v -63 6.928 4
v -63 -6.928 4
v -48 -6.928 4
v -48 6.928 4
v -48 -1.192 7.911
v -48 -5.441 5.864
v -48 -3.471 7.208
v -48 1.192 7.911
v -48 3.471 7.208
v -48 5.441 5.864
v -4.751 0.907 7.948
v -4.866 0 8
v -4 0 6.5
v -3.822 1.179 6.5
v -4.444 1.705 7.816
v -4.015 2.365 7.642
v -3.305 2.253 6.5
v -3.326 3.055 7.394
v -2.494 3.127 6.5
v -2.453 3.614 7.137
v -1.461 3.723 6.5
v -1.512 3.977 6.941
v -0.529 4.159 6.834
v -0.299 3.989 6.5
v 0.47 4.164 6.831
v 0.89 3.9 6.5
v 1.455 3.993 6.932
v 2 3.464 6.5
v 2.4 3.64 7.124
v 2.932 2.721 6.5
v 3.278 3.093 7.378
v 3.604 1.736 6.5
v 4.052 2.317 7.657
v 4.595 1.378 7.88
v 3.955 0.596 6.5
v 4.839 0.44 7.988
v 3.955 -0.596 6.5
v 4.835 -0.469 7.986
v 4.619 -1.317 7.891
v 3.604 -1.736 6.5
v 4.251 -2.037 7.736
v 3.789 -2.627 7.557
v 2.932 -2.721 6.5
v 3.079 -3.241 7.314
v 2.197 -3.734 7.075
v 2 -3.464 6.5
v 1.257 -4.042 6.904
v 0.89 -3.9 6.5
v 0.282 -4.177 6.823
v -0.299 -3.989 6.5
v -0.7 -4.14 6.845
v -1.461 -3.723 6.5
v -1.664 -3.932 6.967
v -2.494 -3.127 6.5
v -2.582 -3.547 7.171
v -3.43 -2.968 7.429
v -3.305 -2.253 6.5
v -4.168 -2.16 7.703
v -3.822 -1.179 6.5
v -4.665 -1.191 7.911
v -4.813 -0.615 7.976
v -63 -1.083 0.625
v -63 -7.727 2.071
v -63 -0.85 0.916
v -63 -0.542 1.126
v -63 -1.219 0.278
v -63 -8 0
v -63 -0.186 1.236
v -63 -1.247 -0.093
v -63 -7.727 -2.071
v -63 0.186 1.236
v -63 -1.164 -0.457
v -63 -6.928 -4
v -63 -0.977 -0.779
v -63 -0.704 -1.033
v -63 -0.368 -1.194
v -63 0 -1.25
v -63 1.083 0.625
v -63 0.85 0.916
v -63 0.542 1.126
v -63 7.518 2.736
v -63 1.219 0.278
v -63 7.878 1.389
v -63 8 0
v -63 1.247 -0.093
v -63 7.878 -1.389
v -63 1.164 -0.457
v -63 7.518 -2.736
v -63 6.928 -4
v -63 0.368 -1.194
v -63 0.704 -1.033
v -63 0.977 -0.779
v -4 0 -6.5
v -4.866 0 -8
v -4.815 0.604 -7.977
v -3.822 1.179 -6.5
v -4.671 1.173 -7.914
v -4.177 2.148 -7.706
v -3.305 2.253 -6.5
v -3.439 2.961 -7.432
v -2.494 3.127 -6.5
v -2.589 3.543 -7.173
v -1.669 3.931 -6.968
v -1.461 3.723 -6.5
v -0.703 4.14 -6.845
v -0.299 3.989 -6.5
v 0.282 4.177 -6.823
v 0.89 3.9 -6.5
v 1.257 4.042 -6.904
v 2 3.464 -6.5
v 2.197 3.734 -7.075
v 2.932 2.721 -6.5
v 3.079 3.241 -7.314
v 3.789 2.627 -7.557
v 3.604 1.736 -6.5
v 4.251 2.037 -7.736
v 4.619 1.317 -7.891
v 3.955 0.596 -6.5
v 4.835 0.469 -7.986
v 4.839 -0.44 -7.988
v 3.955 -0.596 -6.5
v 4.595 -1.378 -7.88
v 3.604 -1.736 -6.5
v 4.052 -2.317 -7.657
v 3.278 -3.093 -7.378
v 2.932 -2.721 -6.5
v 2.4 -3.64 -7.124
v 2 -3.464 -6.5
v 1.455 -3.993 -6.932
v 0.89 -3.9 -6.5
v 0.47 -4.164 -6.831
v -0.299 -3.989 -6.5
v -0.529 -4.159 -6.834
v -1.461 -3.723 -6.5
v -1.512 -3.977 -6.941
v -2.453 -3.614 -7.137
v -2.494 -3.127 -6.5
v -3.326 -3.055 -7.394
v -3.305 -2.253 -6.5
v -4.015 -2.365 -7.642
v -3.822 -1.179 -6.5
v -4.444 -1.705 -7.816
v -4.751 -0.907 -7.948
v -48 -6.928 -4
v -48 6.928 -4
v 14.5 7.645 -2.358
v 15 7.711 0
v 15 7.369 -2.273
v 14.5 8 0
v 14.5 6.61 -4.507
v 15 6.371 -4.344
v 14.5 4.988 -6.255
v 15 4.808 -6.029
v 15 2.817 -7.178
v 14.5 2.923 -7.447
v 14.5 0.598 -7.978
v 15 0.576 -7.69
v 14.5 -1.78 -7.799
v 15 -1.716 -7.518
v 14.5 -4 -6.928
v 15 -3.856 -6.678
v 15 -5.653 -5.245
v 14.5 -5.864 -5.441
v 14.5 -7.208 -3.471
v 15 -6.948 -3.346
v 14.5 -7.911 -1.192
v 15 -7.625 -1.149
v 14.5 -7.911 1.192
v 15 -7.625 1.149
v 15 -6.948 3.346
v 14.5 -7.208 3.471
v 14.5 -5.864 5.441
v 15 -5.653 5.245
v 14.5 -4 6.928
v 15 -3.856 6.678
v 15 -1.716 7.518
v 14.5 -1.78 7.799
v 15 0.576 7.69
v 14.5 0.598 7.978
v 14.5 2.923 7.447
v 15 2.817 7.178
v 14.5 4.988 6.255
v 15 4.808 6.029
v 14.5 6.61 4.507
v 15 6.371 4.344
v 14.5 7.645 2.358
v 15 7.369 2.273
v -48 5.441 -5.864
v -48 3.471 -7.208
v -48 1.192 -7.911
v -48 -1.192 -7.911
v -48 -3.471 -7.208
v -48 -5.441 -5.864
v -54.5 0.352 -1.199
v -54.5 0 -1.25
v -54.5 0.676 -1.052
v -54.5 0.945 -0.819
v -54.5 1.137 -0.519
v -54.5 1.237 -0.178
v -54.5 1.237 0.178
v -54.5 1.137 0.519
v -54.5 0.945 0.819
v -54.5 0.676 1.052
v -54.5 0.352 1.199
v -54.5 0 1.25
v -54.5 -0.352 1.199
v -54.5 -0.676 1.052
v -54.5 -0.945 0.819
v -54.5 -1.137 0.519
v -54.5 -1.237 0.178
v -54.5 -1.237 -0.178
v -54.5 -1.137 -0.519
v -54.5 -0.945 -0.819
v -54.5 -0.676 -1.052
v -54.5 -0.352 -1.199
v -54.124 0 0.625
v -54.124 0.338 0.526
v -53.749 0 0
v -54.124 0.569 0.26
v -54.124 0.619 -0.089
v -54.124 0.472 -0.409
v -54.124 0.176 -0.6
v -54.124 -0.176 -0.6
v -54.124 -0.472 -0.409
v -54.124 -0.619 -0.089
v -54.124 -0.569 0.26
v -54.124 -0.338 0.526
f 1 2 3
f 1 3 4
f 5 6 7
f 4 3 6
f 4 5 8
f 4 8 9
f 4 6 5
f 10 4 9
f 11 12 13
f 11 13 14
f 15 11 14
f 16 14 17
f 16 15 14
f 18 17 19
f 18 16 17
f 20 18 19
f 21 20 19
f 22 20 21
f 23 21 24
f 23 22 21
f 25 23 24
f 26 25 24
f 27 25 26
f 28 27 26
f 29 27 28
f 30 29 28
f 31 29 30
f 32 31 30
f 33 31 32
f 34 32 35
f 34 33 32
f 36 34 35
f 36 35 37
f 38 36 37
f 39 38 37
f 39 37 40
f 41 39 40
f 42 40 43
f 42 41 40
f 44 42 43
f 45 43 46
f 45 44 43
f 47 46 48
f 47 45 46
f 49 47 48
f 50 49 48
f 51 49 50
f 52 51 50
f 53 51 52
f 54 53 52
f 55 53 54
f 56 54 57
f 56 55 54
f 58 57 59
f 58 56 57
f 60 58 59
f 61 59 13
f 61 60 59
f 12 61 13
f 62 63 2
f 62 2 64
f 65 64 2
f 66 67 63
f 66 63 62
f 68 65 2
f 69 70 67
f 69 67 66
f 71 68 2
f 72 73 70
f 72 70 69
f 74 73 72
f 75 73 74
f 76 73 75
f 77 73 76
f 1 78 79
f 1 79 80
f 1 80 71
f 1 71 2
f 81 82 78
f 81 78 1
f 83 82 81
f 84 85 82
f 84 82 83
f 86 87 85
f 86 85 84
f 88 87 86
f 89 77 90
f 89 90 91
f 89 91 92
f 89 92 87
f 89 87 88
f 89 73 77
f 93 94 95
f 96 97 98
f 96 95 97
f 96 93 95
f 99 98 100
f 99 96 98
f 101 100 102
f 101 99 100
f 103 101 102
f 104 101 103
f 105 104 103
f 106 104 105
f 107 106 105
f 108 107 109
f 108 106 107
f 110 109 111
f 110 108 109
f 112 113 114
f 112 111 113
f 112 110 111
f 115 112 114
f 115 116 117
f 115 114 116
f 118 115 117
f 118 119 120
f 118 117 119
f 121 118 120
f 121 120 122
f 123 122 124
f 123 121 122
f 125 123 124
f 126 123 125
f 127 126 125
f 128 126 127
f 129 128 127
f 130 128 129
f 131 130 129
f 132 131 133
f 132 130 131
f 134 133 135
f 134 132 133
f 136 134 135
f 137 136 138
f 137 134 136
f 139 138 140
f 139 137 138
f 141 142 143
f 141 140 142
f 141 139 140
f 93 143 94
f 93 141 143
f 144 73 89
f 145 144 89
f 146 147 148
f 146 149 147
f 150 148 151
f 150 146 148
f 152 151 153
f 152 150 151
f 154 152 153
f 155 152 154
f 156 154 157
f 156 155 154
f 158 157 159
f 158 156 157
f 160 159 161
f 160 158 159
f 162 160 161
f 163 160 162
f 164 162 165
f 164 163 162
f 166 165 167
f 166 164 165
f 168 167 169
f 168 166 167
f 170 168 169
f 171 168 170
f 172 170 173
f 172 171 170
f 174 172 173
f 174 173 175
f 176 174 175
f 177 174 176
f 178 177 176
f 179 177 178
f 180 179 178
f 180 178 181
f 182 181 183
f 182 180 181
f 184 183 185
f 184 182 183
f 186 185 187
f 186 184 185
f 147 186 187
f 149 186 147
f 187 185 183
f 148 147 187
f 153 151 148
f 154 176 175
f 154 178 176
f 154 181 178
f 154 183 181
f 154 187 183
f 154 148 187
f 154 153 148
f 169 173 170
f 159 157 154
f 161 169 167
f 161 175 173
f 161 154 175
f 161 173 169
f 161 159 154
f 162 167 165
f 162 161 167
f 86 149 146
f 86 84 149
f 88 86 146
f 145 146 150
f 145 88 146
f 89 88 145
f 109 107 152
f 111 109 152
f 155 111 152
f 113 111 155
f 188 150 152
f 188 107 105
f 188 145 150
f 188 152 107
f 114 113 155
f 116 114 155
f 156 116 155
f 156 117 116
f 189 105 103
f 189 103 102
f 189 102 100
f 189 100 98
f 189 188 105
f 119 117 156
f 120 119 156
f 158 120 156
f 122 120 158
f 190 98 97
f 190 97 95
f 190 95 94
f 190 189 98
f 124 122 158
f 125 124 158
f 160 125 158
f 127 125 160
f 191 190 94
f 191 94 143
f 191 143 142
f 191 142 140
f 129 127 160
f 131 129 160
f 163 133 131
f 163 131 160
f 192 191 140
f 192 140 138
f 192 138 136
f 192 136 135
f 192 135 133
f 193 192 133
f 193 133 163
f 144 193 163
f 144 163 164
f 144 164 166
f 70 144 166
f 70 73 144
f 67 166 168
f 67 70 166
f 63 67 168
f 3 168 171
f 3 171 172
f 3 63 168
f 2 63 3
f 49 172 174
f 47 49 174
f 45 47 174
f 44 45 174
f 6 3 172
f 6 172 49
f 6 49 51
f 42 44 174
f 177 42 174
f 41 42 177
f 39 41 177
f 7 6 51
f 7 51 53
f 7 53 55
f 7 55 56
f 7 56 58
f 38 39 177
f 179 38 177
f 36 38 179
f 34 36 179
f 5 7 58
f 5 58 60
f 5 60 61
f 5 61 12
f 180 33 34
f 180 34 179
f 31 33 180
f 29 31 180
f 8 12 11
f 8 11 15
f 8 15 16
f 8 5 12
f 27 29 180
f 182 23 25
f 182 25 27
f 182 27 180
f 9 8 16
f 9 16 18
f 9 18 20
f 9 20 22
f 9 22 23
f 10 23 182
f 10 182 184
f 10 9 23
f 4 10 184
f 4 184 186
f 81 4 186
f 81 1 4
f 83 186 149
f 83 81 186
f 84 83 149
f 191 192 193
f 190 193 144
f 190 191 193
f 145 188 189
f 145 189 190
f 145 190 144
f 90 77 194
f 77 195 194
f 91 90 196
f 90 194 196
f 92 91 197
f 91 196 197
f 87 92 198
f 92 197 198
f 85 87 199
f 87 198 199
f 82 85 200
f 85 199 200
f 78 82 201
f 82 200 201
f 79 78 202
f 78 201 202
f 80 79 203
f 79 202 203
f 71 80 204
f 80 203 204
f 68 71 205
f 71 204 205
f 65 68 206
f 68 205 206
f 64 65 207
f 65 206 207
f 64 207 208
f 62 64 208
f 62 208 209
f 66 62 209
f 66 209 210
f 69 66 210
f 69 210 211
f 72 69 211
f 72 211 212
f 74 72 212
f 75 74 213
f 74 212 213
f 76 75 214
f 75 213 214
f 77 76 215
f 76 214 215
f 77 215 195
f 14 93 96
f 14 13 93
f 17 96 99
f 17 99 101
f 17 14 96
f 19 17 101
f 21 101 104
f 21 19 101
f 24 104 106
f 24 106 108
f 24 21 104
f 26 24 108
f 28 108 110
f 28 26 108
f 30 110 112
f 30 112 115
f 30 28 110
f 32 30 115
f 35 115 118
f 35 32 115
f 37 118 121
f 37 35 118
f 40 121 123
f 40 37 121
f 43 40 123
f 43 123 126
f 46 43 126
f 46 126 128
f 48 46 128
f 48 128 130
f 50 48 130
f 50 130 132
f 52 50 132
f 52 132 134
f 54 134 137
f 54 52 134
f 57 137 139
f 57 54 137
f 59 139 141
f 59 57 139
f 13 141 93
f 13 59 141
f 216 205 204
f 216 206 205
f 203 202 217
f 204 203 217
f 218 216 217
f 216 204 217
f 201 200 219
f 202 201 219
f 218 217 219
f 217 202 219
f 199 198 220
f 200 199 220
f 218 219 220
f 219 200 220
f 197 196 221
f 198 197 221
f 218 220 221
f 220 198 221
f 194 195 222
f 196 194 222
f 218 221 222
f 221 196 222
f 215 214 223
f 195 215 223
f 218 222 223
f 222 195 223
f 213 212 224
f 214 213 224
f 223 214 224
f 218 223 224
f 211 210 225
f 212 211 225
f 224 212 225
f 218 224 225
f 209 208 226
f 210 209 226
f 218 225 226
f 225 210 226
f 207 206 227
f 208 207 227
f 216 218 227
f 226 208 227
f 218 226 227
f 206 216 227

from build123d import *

# Parameters (mm, degrees)
SKIZZE5_OUTSIDE_W               = 34.244
SKIZZE5_OUTSIDE_H               = 34.244
SKIZZE5_OUTSIDE_W_2             = 8
SKIZZE5_OUTSIDE_H_2             = 20
SCHNITT_LINEAR_AUSTRAGEN1_DEPTH = 15
M3_GEWINDEBOHRUNG1_D            = 2.5
M3_GEWINDEBOHRUNG1_DEPTH        = 8.5
M3_GEWINDEBOHRUNG1_TIP          = 0.751075774


with BuildPart() as part:
    # Skizze2 one side → Rotation1 (revolve)
    with BuildSketch(Plane.XY):
        with BuildLine():
            Line((-4, 0), (4, 0))
            ThreePointArc((4, 0), (0, 4), (-4, 0))
        make_face()
        Polygon((-63, 0), (15, 0), (15, 7.711324865), (14.5, 8), (-63, 8), align=None)
    revolve(axis=Axis((15, 0, 0), (-1, 0, 0)))

    # Skizze3 → Schnitt-Rotation1 (revolve, cut)
    with BuildSketch(Plane(origin=(0, 0, 0), x_dir=(1, 0, 0), z_dir=(0, 1, 0))):
        Polygon((-4.866025404, 8), (-4, 6.5), (-4, -6.5), (-4.866025404, -8), (0, -8), (0, 8), align=None)
    revolve(axis=Axis((0, 0, 8), (0, 0, -1)), mode=Mode.SUBTRACT)

    # Skizze5 outside → Schnitt-Linear austragen1 (cut)
    with BuildSketch(Plane.ZY.offset(63)):
        Rectangle(SKIZZE5_OUTSIDE_W, SKIZZE5_OUTSIDE_H)
        Rectangle(SKIZZE5_OUTSIDE_W_2, SKIZZE5_OUTSIDE_H_2, mode=Mode.SUBTRACT)
    extrude(amount=-SCHNITT_LINEAR_AUSTRAGEN1_DEPTH, mode=Mode.SUBTRACT)

    # M3 Gewindebohrung1
    with Locations(Plane.ZY.offset(63)):
        with Locations((0, 0)):
            Hole(M3_GEWINDEBOHRUNG1_D / 2, depth=M3_GEWINDEBOHRUNG1_DEPTH)
            with Locations((0, 0, -(M3_GEWINDEBOHRUNG1_DEPTH + M3_GEWINDEBOHRUNG1_TIP / 2))):  # 118° drill point
                Cone(0, M3_GEWINDEBOHRUNG1_D / 2, M3_GEWINDEBOHRUNG1_TIP, mode=Mode.SUBTRACT)


solid = part.part
